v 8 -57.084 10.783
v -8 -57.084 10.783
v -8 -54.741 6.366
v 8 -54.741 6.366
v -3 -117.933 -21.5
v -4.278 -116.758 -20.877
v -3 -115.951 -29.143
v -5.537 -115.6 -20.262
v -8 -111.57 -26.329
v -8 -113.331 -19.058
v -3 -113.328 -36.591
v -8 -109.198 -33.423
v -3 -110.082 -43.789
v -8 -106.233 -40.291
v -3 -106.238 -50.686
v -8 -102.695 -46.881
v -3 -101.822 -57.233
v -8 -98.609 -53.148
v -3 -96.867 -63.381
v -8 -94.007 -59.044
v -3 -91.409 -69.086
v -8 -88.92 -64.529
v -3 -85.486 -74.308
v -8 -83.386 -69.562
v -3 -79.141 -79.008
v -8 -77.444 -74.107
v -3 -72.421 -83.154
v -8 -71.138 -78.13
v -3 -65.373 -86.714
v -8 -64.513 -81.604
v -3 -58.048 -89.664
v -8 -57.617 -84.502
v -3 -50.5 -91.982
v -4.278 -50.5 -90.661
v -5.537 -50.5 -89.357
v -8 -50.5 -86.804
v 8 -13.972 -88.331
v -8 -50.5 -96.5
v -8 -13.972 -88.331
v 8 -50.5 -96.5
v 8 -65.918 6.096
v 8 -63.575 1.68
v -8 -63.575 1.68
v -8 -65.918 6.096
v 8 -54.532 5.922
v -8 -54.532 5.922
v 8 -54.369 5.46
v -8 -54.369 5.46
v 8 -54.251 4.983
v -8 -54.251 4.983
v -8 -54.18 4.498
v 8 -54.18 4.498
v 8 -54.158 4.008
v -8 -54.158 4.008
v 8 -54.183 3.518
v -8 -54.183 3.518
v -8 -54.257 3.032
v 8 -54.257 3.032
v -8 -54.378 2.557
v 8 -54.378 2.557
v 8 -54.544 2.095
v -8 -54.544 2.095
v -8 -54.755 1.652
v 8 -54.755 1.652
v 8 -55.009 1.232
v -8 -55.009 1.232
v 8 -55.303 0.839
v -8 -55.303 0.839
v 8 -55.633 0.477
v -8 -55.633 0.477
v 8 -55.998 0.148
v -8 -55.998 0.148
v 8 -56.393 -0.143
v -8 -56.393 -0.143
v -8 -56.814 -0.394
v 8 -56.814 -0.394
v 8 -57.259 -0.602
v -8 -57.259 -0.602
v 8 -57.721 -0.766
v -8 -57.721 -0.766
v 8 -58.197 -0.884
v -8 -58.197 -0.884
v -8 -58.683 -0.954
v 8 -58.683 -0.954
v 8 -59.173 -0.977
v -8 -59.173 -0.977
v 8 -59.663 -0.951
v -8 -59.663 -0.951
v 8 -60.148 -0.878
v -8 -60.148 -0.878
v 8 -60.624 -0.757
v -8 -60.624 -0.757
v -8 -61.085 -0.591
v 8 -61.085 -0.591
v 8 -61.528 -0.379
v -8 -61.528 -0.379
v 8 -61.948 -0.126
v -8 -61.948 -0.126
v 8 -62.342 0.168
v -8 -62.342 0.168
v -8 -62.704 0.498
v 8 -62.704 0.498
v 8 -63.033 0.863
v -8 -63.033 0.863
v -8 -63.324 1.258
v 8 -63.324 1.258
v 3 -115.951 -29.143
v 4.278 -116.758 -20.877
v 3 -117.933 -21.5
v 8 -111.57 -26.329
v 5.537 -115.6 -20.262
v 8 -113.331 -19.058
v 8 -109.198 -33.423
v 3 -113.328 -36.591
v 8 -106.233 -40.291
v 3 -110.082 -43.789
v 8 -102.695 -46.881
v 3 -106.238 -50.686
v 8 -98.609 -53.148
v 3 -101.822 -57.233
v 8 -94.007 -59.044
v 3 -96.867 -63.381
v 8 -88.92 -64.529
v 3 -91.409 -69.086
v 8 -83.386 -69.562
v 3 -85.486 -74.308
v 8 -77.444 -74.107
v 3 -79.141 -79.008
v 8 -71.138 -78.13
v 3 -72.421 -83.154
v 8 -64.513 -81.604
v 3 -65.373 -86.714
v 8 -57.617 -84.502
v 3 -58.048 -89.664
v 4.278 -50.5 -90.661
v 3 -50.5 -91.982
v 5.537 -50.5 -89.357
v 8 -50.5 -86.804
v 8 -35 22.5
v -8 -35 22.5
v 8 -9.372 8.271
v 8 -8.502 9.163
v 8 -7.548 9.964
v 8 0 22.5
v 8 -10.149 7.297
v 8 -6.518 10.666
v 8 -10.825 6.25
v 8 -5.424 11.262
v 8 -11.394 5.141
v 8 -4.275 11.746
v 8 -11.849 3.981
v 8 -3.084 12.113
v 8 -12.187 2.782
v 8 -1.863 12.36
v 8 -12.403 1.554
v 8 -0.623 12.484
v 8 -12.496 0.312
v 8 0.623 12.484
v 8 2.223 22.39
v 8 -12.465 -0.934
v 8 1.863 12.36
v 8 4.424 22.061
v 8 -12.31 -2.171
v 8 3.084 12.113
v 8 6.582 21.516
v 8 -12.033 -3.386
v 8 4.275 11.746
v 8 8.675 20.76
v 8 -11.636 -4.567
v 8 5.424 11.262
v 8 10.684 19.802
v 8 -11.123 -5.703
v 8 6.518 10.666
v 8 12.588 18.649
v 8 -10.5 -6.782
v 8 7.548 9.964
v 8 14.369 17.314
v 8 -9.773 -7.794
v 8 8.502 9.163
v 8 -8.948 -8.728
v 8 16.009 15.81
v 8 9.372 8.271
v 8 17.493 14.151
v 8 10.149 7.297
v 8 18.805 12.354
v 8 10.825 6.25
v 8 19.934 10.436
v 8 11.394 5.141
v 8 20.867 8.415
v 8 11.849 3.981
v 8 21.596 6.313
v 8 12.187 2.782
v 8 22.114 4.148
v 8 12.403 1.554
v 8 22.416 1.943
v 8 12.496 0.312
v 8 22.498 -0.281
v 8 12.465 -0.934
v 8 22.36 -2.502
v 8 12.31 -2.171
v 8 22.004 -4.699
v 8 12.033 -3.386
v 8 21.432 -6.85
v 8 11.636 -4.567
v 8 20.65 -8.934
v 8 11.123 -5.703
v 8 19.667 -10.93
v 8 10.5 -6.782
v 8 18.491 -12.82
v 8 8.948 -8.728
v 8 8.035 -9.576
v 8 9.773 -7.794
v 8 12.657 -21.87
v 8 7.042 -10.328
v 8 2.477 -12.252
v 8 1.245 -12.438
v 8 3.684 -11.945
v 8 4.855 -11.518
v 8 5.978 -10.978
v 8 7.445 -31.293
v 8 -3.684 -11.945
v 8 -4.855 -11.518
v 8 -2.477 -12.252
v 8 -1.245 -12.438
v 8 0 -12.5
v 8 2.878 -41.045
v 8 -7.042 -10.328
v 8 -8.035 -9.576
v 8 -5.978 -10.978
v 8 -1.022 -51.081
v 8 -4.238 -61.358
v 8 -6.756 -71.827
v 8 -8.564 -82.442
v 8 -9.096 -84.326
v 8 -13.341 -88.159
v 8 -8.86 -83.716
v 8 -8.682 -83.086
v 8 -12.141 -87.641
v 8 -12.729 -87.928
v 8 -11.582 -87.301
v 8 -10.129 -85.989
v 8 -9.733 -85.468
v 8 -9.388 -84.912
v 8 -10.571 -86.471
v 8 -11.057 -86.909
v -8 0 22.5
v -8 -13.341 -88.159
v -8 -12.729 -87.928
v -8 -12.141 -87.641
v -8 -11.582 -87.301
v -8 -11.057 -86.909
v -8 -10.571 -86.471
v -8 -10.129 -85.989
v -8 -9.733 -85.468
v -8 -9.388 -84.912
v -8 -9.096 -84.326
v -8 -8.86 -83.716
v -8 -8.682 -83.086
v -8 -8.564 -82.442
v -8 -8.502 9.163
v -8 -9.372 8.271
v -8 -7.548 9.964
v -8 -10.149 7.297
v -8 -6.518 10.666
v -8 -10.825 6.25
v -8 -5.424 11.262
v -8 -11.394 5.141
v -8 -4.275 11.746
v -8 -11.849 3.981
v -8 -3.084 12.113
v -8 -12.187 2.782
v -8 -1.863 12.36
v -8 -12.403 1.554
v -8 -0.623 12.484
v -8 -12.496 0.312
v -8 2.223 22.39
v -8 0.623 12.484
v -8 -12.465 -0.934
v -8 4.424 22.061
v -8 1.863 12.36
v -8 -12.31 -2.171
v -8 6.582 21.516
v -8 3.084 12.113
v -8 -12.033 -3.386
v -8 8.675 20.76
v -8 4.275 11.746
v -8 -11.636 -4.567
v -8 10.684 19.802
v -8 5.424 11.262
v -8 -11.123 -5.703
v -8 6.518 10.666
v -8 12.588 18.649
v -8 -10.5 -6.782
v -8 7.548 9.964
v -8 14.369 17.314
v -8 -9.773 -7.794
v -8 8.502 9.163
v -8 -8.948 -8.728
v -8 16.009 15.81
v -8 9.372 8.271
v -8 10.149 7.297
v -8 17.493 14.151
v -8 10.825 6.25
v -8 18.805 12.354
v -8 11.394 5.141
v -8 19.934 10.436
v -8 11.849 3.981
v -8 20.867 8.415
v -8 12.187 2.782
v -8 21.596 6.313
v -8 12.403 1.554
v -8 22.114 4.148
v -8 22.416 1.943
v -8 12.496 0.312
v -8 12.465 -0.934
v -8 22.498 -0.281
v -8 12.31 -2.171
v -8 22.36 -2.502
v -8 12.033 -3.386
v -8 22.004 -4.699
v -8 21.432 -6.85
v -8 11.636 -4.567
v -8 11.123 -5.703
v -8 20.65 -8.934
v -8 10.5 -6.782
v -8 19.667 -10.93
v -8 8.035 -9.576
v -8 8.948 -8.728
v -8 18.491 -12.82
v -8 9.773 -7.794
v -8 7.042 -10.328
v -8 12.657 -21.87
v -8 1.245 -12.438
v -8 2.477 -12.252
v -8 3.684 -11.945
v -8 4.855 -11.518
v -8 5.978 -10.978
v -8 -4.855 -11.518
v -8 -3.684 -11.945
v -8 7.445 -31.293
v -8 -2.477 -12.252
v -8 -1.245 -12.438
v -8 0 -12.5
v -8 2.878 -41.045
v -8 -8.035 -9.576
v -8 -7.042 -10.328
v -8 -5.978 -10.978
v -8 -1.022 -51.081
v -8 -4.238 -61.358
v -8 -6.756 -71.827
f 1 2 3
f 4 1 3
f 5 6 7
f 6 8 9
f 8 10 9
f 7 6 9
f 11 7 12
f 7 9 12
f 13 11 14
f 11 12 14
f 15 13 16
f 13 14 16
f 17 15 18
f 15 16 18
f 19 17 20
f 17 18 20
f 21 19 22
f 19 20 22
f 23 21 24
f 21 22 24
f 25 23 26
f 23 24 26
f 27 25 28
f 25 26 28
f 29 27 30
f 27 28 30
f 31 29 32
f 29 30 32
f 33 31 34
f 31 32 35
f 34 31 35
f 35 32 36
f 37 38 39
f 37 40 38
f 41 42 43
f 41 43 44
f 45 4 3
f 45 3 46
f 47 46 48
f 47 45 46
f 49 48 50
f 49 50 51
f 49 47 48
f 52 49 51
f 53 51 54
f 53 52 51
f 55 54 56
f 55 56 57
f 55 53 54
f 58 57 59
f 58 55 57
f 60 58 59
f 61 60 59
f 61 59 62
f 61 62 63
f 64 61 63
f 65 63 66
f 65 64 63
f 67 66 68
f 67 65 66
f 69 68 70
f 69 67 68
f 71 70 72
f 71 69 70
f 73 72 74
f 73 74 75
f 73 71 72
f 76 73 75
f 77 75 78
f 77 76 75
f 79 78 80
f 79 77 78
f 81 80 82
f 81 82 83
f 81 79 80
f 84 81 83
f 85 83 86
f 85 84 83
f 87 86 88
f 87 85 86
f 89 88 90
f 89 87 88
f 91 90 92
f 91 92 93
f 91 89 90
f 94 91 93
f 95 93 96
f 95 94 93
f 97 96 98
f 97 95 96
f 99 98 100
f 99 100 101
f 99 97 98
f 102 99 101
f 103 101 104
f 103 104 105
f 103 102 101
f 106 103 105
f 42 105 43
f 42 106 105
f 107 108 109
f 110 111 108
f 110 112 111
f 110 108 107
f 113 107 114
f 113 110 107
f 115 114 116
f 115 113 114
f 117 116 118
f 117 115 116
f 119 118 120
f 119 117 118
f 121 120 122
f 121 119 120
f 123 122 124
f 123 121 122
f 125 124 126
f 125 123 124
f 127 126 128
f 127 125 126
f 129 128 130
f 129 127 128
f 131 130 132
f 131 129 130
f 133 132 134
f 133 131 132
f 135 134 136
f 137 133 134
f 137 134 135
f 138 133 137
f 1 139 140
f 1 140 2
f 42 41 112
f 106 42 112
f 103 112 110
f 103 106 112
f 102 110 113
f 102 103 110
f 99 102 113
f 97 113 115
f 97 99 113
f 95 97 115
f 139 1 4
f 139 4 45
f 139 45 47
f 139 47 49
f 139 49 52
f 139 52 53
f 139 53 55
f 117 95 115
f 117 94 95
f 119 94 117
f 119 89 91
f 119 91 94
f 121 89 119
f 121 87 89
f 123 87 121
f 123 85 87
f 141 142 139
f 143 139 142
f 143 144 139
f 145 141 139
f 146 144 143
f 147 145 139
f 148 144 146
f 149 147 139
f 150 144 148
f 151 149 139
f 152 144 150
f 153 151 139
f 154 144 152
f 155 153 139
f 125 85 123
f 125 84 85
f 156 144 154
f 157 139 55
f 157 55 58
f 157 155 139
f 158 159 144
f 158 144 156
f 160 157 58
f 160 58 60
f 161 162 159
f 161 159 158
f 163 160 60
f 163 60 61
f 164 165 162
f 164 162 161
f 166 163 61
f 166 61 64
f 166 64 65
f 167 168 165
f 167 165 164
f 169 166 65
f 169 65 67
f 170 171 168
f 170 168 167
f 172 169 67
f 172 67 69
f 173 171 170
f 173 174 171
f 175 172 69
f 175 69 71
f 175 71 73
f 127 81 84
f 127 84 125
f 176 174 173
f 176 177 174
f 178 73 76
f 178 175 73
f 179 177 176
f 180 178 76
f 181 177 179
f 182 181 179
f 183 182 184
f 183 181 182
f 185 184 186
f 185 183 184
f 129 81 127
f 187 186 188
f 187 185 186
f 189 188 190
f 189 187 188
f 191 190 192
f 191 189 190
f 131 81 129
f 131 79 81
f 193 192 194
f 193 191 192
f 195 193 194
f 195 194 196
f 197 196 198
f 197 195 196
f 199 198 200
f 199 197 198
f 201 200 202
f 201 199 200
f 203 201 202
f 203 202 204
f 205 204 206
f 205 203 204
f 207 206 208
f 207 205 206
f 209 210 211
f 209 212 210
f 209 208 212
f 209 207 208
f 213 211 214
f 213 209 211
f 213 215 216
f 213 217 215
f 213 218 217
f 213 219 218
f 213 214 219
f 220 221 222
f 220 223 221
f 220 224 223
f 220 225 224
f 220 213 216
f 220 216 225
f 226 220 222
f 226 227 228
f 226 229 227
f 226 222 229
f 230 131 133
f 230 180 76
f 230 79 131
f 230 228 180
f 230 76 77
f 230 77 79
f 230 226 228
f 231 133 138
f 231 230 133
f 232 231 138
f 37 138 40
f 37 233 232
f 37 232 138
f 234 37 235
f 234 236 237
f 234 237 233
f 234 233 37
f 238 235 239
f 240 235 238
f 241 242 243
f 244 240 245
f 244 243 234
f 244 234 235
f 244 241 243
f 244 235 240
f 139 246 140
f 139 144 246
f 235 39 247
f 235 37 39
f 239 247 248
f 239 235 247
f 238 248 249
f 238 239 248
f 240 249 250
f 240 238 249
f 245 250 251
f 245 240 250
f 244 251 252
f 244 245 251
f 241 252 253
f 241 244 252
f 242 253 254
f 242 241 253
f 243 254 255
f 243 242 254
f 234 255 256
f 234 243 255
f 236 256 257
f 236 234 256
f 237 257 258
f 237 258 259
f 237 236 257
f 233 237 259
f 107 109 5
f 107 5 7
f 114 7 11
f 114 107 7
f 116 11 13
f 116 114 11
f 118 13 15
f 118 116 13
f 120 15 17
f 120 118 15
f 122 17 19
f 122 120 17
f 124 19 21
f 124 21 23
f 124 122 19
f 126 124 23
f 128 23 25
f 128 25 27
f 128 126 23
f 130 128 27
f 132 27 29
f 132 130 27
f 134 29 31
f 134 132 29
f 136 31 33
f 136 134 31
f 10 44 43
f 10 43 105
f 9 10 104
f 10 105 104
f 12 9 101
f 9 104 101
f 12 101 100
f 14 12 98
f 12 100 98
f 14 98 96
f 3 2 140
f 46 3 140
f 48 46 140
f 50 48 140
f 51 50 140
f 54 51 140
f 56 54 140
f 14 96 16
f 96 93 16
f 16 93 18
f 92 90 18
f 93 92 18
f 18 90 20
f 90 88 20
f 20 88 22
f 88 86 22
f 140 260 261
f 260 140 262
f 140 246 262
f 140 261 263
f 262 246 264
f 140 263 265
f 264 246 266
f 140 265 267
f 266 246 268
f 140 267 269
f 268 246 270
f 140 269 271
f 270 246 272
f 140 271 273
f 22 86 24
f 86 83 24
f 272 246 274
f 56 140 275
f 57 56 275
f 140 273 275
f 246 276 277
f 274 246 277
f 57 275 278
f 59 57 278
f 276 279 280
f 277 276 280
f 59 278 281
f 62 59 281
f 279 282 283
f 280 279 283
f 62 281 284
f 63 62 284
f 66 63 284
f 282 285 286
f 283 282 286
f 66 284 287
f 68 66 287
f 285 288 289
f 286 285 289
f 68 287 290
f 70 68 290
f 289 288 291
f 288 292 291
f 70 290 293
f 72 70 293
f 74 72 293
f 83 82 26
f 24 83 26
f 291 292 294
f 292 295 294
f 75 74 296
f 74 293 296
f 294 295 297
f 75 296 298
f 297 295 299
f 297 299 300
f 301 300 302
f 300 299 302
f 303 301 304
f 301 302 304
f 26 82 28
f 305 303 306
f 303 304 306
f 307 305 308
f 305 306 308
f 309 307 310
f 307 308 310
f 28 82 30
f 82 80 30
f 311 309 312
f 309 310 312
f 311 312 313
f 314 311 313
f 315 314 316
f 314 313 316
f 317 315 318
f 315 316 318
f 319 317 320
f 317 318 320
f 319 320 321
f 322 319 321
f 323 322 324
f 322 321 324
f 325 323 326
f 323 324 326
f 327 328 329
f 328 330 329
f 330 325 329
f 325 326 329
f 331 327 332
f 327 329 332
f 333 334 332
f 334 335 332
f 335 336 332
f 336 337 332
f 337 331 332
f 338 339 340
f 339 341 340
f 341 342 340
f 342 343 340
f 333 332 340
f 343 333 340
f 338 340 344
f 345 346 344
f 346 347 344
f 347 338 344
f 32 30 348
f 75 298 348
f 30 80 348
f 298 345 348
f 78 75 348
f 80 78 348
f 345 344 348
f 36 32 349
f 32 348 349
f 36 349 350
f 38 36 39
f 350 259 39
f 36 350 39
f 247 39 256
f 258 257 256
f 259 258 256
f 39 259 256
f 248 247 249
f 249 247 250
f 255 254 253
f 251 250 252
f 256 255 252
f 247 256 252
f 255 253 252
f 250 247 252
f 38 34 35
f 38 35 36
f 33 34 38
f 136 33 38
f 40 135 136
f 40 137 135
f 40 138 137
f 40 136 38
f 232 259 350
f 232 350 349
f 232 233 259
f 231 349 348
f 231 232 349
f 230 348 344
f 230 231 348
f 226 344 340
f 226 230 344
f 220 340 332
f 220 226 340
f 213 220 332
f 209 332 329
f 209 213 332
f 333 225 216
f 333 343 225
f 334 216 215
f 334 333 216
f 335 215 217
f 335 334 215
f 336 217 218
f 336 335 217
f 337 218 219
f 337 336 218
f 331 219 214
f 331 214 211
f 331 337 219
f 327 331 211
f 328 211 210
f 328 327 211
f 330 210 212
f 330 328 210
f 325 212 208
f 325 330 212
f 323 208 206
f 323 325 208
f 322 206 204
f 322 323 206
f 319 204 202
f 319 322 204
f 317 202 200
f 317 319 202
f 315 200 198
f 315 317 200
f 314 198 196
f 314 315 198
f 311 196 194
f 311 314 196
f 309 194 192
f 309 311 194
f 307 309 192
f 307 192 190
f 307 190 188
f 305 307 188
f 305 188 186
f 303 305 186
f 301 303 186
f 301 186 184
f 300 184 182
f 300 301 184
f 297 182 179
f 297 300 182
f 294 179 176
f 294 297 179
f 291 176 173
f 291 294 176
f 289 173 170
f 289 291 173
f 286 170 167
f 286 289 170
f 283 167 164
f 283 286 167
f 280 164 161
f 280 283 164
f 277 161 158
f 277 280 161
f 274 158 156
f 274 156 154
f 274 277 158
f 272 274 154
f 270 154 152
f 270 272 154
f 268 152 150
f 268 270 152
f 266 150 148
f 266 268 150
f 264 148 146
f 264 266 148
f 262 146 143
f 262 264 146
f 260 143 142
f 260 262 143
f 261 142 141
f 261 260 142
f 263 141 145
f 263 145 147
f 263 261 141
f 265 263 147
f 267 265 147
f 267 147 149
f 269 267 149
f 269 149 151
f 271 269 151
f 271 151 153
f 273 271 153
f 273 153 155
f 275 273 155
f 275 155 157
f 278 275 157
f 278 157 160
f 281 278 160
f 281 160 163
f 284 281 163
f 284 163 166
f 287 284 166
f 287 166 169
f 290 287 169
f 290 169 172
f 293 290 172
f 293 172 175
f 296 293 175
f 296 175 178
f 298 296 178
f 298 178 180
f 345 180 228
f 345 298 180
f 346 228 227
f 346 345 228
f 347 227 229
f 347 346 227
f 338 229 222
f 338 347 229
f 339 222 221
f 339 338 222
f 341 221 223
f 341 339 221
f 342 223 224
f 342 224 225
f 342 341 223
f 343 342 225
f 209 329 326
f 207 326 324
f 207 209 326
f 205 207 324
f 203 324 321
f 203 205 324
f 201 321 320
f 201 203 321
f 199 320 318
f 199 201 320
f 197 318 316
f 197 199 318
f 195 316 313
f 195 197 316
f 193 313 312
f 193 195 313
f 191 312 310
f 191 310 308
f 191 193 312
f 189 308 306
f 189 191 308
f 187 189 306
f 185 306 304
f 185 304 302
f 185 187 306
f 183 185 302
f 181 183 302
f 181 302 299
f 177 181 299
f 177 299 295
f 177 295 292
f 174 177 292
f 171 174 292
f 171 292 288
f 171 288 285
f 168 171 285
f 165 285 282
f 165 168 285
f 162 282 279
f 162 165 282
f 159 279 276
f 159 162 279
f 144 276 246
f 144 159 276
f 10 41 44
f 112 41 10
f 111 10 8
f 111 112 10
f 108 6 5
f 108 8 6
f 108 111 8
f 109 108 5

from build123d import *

# Parameters (mm, degrees)
SKETCH_1_R      = 12.5
EXTRUDE_1_DEPTH = 8
CHAMFER_1_SIZE  = 5


with BuildPart() as part:
    # 草图1 → 凸台-拉伸1 (new, symmetric)
    with BuildSketch(Plane(origin=(0, 0, 0), x_dir=(0, 0, -1), z_dir=(1, 0, 0))):
        with BuildLine():
            Line((-22.5, 0), (-22.5, -35))
            Line((-22.5, -35), (-10.783162242, -57.084286562))
            Line((-10.783162242, -57.084286562), (-6.36630493, -54.74091901))
            ThreePointArc((-6.36630493, -54.74091901), (0.393919934, -56.814408771), (-1.679569826, -63.574633635))
            Line((-1.679569826, -63.574633635), (-6.096427139, -65.918001187))
            Line((-6.096427139, -65.918001187), (21.5, -117.932667397))
            ThreePointArc((21.5, -117.932667397), (66.291252117, -94.19847395), (91.981942633, -50.5))
            Line((91.981942633, -50.5), (96.5, -50.5))
            Line((96.5, -50.5), (88.331264802, -13.972315085))
            ThreePointArc((88.331264802, -13.972315085), (86.235037436, -10.344476702), (82.442373664, -8.563723486))
            ThreePointArc((82.442373664, -8.563723486), (46.03018843, 0.843735432), (12.819740934, 18.490652838))
            ThreePointArc((12.819740934, 18.490652838), (-10.435655921, 19.933566803), (-22.5, 0))
        make_face()
        Circle(SKETCH_1_R, mode=Mode.SUBTRACT)
    extrude(amount=EXTRUDE_1_DEPTH, both=True)

    # 倒角1
    chamfer_1_edges = [part.edges().sort_by_distance(p)[0] for p in [
        (-8, -94.19847395, -66.291252117),
        (8, -94.19847395, -66.291252117),
    ]]
    chamfer(chamfer_1_edges, length=CHAMFER_1_SIZE)


solid = part.part
